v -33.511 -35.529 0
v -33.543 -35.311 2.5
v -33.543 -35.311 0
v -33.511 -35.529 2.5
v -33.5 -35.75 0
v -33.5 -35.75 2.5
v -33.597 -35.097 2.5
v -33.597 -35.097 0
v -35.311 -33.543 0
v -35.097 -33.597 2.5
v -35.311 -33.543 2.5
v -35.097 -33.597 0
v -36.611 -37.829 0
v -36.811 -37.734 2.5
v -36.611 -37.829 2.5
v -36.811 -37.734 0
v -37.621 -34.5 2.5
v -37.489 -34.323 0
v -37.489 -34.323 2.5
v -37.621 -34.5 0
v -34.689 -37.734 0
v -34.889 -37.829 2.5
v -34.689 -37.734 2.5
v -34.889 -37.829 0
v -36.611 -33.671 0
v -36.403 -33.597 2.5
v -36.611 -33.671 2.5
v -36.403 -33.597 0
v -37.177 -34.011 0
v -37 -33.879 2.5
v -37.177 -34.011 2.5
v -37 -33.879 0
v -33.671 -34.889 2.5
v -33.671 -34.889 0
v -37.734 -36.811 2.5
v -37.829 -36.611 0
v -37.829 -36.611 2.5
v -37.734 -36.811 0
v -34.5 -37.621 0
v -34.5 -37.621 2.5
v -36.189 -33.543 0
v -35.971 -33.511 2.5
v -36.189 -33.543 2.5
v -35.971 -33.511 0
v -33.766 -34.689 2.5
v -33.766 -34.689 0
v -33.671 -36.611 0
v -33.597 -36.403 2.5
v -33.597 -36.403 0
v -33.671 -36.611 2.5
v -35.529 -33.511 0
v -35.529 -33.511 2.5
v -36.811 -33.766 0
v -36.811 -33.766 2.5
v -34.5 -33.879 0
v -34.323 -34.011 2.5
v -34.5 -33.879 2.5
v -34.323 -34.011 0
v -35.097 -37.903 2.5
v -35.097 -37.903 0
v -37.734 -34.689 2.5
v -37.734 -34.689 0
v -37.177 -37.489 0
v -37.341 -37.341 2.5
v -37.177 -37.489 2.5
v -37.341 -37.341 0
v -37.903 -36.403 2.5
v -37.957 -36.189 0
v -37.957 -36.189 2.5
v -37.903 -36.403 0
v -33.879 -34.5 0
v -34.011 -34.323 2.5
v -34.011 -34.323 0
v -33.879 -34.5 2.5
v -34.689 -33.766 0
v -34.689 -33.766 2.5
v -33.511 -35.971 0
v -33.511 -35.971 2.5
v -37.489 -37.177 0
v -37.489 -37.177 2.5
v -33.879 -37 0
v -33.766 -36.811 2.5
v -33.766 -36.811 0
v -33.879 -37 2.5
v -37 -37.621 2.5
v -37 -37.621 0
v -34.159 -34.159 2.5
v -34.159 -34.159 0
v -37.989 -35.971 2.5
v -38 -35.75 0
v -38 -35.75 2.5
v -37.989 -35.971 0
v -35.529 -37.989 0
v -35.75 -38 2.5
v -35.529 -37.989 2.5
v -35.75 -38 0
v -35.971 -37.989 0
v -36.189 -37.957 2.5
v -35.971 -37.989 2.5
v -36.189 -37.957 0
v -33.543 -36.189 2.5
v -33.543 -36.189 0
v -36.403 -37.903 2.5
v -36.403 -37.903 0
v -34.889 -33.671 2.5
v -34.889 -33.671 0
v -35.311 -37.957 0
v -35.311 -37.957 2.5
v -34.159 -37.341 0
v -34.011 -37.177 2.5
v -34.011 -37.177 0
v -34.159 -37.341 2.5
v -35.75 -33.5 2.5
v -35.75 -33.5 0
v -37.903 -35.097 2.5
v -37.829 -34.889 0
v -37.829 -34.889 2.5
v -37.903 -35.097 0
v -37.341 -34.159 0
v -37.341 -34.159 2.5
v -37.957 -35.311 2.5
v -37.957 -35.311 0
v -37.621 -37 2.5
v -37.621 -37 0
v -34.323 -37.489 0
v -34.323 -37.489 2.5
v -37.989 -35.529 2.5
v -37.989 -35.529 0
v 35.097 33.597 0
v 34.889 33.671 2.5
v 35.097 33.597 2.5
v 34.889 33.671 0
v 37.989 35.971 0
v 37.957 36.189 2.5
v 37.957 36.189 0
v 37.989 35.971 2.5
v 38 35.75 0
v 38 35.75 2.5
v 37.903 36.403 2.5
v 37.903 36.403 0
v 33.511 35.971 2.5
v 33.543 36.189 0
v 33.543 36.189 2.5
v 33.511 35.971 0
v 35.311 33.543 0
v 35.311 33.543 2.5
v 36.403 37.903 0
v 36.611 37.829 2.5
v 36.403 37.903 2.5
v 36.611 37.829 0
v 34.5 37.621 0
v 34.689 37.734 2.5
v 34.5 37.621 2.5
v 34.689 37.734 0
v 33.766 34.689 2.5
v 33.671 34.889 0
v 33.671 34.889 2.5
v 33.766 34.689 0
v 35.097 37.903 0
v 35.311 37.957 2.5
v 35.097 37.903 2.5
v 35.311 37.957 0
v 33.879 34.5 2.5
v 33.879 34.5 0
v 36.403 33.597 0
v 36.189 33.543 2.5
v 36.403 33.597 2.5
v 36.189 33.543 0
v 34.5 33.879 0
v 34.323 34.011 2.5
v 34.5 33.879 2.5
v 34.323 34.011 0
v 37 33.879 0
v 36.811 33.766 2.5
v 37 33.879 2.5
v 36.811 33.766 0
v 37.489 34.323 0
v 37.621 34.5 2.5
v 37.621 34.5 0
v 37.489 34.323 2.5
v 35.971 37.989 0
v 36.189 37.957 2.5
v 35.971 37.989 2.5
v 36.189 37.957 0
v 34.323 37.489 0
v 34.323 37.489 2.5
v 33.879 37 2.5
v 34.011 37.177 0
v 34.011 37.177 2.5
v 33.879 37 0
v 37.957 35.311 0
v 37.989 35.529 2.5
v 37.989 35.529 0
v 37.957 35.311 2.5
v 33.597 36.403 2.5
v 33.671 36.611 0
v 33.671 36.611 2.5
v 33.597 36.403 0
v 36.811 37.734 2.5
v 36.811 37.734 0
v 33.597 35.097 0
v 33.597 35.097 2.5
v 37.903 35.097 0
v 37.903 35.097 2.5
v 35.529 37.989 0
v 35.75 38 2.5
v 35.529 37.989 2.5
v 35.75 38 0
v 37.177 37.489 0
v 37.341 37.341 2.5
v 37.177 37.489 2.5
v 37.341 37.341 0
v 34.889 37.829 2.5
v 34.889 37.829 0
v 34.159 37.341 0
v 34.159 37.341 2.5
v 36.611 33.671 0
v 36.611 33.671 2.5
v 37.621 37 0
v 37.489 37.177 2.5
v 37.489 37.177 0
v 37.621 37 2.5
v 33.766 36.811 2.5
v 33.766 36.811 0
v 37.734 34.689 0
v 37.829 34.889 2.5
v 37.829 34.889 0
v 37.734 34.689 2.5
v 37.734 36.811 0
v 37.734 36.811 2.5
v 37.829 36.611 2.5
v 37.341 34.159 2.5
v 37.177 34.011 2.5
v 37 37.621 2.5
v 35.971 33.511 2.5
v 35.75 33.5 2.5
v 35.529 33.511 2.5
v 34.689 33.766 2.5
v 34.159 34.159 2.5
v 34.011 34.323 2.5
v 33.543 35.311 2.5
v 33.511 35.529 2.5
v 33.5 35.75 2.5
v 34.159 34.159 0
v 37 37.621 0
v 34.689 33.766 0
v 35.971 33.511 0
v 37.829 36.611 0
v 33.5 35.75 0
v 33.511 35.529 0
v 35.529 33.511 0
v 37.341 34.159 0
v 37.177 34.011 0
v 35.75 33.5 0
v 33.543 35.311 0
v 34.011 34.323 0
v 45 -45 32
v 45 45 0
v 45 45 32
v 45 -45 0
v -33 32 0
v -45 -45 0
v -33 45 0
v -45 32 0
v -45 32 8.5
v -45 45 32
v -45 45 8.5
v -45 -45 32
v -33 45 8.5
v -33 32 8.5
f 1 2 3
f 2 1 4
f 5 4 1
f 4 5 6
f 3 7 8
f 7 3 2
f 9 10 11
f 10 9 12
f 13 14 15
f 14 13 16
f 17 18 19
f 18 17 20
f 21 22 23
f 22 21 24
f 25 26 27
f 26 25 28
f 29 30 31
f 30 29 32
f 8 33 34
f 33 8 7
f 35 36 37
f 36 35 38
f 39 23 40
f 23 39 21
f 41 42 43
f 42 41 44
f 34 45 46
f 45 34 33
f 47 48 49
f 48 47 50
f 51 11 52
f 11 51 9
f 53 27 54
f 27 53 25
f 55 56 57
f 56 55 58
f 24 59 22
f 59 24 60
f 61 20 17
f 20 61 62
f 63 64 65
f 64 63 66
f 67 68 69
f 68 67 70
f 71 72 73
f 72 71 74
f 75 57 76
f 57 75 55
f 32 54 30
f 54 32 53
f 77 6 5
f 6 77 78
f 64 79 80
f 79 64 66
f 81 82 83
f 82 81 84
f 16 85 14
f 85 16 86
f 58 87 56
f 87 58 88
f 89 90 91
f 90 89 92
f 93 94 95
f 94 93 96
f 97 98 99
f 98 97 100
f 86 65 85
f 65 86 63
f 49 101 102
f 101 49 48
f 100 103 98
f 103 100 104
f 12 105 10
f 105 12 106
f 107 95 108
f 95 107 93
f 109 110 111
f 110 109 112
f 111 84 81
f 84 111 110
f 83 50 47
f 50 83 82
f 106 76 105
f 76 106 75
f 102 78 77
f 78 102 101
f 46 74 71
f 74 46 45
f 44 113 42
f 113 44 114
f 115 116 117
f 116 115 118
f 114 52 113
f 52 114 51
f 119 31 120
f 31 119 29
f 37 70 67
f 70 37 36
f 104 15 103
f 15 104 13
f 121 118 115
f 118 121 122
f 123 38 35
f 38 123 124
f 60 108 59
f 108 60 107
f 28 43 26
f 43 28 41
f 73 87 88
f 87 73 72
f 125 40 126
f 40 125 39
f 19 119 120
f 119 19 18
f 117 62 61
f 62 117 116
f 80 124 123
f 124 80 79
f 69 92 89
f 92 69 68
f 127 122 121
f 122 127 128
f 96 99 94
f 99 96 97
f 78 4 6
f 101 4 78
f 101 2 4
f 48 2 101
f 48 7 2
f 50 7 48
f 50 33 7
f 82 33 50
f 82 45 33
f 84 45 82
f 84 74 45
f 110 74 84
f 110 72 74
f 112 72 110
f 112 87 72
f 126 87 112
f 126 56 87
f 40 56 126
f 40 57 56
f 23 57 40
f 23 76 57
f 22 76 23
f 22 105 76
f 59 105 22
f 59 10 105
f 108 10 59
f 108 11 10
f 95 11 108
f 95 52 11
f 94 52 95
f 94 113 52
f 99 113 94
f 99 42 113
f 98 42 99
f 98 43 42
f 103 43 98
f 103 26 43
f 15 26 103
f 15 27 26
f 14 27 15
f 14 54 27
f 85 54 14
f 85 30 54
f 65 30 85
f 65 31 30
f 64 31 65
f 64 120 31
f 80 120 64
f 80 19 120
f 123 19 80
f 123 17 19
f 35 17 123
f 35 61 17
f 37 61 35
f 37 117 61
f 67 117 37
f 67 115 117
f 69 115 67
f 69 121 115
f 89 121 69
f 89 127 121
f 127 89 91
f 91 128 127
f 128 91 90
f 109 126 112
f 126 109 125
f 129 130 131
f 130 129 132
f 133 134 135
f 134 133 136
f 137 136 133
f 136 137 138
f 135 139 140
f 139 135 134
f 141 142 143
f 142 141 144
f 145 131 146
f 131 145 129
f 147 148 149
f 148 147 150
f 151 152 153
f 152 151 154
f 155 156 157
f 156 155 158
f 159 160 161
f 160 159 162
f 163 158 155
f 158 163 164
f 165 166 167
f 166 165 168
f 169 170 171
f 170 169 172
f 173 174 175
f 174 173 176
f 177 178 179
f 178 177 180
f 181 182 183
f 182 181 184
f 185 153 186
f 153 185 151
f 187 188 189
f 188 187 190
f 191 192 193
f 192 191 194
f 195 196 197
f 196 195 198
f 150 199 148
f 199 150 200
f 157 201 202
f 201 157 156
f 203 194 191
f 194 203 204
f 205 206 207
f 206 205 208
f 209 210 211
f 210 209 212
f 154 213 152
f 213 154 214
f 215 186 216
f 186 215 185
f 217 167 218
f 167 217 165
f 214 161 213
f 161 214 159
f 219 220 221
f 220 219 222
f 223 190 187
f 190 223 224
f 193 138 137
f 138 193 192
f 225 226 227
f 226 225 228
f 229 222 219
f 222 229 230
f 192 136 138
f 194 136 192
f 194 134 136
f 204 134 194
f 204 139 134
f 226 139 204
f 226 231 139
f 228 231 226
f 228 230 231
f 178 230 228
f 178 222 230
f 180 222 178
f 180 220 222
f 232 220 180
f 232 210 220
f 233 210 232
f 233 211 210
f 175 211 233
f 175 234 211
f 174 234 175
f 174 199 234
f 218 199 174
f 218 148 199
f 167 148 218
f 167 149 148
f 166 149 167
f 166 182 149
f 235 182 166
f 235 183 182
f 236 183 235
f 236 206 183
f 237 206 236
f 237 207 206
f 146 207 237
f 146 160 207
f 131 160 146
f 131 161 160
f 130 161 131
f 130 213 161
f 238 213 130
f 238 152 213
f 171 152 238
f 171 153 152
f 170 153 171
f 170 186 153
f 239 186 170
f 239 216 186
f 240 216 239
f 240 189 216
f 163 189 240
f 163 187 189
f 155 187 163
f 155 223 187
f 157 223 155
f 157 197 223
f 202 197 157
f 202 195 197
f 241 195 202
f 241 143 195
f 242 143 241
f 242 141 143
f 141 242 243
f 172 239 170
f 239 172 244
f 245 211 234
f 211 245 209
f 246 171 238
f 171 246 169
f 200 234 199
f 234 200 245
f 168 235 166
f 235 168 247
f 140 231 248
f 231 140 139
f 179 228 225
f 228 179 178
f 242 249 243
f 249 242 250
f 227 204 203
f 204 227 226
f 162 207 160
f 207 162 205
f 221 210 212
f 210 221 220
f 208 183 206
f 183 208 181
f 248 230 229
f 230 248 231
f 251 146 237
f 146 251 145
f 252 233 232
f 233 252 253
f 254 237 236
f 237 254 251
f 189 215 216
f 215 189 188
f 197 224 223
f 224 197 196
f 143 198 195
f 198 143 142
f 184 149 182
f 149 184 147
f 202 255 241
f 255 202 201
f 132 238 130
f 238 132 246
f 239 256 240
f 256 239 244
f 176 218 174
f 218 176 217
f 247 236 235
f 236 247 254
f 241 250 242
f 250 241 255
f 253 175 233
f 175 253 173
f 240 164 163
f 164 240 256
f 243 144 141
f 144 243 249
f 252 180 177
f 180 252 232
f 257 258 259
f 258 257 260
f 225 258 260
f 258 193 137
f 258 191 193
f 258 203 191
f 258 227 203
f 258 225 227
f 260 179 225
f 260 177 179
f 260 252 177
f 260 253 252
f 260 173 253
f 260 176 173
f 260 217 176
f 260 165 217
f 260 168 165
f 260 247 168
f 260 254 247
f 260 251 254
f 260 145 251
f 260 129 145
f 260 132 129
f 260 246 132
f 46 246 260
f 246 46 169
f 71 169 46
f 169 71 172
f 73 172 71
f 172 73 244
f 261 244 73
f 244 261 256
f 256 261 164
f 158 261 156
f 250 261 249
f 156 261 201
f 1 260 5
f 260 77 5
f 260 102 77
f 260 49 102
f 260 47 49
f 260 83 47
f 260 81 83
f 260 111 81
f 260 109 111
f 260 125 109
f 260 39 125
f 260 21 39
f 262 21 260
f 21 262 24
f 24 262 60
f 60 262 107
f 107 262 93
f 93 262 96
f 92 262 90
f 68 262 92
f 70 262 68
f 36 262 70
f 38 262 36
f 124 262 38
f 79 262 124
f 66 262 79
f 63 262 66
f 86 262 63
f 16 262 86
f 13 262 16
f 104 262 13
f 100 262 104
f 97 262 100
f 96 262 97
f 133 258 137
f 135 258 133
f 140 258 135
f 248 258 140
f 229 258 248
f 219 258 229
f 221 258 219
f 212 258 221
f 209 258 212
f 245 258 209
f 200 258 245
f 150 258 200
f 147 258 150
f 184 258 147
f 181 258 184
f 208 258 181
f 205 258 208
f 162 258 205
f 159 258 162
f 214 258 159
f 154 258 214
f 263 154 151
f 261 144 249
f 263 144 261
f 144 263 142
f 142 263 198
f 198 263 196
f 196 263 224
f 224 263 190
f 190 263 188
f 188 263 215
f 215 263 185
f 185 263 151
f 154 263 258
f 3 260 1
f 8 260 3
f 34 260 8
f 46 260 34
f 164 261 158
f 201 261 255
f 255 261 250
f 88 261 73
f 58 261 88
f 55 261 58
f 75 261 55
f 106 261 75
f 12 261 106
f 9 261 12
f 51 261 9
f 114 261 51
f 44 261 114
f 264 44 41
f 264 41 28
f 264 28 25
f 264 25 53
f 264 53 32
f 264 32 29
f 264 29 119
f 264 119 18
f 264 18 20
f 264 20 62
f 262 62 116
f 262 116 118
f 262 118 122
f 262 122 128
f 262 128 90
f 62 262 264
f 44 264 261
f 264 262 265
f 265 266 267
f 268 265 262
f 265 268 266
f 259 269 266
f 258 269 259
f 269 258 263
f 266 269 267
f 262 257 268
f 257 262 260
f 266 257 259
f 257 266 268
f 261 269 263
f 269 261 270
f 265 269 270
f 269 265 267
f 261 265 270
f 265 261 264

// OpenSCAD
// Magnetic stirrer housing - upside-down open box over 80 mm PC fan
// Print orientation: top plate on bed (z = 0), walls rise to z = 40

$fn = 64;

// ---- Dimensions (mm) ----
plate_t      = 2;     // top plate thickness
wall_t       = 2.5;   // wall thickness
box_h        = 40;    // total height of box (open top)
outer_x      = 90;    // outer size in X
outer_y      = 90;    // outer size in Y
hole_d       = 4.5;   // M4 screw hole diameter
hole_p       = 71.5;  // square pitch of hole pattern
notch_w      = 12;    // cable notch width
notch_depth  = 8;     // cable notch depth from open edge
eps          = 0.5;   // cutter overshoot past faces

// ---- Derived ----
notch_z0 = box_h - notch_depth;  // notch runs from here to open edge

difference() {
    // Outer block
    translate([-outer_x/2, -outer_y/2, 0])
        cube([outer_x, outer_y, box_h]);

    // Open top: cut down to notch_z0, leaving walls above
    translate([-outer_x/2, -outer_y/2, notch_z0])
        cube([outer_x, outer_y, notch_depth + eps]);

    // Screw holes through top plate
    for (i = [0 : 3]) {
        for (j = [0 : 3]) {
            if ((i + j) % 2 == 0) {  // 4 holes on square pattern
                translate([(i - 1.5) * hole_p, (j - 1.5) * hole_p, -eps])
                    cylinder(d = hole_d, h = plate_t + 2 * eps);
            }
        }
    }

    // Cable notch in one wall (along X, centred)
    translate([-outer_y/2, box_h - notch_depth, 0])
        cube([notch_w, outer_y, notch_depth + eps]);
}
